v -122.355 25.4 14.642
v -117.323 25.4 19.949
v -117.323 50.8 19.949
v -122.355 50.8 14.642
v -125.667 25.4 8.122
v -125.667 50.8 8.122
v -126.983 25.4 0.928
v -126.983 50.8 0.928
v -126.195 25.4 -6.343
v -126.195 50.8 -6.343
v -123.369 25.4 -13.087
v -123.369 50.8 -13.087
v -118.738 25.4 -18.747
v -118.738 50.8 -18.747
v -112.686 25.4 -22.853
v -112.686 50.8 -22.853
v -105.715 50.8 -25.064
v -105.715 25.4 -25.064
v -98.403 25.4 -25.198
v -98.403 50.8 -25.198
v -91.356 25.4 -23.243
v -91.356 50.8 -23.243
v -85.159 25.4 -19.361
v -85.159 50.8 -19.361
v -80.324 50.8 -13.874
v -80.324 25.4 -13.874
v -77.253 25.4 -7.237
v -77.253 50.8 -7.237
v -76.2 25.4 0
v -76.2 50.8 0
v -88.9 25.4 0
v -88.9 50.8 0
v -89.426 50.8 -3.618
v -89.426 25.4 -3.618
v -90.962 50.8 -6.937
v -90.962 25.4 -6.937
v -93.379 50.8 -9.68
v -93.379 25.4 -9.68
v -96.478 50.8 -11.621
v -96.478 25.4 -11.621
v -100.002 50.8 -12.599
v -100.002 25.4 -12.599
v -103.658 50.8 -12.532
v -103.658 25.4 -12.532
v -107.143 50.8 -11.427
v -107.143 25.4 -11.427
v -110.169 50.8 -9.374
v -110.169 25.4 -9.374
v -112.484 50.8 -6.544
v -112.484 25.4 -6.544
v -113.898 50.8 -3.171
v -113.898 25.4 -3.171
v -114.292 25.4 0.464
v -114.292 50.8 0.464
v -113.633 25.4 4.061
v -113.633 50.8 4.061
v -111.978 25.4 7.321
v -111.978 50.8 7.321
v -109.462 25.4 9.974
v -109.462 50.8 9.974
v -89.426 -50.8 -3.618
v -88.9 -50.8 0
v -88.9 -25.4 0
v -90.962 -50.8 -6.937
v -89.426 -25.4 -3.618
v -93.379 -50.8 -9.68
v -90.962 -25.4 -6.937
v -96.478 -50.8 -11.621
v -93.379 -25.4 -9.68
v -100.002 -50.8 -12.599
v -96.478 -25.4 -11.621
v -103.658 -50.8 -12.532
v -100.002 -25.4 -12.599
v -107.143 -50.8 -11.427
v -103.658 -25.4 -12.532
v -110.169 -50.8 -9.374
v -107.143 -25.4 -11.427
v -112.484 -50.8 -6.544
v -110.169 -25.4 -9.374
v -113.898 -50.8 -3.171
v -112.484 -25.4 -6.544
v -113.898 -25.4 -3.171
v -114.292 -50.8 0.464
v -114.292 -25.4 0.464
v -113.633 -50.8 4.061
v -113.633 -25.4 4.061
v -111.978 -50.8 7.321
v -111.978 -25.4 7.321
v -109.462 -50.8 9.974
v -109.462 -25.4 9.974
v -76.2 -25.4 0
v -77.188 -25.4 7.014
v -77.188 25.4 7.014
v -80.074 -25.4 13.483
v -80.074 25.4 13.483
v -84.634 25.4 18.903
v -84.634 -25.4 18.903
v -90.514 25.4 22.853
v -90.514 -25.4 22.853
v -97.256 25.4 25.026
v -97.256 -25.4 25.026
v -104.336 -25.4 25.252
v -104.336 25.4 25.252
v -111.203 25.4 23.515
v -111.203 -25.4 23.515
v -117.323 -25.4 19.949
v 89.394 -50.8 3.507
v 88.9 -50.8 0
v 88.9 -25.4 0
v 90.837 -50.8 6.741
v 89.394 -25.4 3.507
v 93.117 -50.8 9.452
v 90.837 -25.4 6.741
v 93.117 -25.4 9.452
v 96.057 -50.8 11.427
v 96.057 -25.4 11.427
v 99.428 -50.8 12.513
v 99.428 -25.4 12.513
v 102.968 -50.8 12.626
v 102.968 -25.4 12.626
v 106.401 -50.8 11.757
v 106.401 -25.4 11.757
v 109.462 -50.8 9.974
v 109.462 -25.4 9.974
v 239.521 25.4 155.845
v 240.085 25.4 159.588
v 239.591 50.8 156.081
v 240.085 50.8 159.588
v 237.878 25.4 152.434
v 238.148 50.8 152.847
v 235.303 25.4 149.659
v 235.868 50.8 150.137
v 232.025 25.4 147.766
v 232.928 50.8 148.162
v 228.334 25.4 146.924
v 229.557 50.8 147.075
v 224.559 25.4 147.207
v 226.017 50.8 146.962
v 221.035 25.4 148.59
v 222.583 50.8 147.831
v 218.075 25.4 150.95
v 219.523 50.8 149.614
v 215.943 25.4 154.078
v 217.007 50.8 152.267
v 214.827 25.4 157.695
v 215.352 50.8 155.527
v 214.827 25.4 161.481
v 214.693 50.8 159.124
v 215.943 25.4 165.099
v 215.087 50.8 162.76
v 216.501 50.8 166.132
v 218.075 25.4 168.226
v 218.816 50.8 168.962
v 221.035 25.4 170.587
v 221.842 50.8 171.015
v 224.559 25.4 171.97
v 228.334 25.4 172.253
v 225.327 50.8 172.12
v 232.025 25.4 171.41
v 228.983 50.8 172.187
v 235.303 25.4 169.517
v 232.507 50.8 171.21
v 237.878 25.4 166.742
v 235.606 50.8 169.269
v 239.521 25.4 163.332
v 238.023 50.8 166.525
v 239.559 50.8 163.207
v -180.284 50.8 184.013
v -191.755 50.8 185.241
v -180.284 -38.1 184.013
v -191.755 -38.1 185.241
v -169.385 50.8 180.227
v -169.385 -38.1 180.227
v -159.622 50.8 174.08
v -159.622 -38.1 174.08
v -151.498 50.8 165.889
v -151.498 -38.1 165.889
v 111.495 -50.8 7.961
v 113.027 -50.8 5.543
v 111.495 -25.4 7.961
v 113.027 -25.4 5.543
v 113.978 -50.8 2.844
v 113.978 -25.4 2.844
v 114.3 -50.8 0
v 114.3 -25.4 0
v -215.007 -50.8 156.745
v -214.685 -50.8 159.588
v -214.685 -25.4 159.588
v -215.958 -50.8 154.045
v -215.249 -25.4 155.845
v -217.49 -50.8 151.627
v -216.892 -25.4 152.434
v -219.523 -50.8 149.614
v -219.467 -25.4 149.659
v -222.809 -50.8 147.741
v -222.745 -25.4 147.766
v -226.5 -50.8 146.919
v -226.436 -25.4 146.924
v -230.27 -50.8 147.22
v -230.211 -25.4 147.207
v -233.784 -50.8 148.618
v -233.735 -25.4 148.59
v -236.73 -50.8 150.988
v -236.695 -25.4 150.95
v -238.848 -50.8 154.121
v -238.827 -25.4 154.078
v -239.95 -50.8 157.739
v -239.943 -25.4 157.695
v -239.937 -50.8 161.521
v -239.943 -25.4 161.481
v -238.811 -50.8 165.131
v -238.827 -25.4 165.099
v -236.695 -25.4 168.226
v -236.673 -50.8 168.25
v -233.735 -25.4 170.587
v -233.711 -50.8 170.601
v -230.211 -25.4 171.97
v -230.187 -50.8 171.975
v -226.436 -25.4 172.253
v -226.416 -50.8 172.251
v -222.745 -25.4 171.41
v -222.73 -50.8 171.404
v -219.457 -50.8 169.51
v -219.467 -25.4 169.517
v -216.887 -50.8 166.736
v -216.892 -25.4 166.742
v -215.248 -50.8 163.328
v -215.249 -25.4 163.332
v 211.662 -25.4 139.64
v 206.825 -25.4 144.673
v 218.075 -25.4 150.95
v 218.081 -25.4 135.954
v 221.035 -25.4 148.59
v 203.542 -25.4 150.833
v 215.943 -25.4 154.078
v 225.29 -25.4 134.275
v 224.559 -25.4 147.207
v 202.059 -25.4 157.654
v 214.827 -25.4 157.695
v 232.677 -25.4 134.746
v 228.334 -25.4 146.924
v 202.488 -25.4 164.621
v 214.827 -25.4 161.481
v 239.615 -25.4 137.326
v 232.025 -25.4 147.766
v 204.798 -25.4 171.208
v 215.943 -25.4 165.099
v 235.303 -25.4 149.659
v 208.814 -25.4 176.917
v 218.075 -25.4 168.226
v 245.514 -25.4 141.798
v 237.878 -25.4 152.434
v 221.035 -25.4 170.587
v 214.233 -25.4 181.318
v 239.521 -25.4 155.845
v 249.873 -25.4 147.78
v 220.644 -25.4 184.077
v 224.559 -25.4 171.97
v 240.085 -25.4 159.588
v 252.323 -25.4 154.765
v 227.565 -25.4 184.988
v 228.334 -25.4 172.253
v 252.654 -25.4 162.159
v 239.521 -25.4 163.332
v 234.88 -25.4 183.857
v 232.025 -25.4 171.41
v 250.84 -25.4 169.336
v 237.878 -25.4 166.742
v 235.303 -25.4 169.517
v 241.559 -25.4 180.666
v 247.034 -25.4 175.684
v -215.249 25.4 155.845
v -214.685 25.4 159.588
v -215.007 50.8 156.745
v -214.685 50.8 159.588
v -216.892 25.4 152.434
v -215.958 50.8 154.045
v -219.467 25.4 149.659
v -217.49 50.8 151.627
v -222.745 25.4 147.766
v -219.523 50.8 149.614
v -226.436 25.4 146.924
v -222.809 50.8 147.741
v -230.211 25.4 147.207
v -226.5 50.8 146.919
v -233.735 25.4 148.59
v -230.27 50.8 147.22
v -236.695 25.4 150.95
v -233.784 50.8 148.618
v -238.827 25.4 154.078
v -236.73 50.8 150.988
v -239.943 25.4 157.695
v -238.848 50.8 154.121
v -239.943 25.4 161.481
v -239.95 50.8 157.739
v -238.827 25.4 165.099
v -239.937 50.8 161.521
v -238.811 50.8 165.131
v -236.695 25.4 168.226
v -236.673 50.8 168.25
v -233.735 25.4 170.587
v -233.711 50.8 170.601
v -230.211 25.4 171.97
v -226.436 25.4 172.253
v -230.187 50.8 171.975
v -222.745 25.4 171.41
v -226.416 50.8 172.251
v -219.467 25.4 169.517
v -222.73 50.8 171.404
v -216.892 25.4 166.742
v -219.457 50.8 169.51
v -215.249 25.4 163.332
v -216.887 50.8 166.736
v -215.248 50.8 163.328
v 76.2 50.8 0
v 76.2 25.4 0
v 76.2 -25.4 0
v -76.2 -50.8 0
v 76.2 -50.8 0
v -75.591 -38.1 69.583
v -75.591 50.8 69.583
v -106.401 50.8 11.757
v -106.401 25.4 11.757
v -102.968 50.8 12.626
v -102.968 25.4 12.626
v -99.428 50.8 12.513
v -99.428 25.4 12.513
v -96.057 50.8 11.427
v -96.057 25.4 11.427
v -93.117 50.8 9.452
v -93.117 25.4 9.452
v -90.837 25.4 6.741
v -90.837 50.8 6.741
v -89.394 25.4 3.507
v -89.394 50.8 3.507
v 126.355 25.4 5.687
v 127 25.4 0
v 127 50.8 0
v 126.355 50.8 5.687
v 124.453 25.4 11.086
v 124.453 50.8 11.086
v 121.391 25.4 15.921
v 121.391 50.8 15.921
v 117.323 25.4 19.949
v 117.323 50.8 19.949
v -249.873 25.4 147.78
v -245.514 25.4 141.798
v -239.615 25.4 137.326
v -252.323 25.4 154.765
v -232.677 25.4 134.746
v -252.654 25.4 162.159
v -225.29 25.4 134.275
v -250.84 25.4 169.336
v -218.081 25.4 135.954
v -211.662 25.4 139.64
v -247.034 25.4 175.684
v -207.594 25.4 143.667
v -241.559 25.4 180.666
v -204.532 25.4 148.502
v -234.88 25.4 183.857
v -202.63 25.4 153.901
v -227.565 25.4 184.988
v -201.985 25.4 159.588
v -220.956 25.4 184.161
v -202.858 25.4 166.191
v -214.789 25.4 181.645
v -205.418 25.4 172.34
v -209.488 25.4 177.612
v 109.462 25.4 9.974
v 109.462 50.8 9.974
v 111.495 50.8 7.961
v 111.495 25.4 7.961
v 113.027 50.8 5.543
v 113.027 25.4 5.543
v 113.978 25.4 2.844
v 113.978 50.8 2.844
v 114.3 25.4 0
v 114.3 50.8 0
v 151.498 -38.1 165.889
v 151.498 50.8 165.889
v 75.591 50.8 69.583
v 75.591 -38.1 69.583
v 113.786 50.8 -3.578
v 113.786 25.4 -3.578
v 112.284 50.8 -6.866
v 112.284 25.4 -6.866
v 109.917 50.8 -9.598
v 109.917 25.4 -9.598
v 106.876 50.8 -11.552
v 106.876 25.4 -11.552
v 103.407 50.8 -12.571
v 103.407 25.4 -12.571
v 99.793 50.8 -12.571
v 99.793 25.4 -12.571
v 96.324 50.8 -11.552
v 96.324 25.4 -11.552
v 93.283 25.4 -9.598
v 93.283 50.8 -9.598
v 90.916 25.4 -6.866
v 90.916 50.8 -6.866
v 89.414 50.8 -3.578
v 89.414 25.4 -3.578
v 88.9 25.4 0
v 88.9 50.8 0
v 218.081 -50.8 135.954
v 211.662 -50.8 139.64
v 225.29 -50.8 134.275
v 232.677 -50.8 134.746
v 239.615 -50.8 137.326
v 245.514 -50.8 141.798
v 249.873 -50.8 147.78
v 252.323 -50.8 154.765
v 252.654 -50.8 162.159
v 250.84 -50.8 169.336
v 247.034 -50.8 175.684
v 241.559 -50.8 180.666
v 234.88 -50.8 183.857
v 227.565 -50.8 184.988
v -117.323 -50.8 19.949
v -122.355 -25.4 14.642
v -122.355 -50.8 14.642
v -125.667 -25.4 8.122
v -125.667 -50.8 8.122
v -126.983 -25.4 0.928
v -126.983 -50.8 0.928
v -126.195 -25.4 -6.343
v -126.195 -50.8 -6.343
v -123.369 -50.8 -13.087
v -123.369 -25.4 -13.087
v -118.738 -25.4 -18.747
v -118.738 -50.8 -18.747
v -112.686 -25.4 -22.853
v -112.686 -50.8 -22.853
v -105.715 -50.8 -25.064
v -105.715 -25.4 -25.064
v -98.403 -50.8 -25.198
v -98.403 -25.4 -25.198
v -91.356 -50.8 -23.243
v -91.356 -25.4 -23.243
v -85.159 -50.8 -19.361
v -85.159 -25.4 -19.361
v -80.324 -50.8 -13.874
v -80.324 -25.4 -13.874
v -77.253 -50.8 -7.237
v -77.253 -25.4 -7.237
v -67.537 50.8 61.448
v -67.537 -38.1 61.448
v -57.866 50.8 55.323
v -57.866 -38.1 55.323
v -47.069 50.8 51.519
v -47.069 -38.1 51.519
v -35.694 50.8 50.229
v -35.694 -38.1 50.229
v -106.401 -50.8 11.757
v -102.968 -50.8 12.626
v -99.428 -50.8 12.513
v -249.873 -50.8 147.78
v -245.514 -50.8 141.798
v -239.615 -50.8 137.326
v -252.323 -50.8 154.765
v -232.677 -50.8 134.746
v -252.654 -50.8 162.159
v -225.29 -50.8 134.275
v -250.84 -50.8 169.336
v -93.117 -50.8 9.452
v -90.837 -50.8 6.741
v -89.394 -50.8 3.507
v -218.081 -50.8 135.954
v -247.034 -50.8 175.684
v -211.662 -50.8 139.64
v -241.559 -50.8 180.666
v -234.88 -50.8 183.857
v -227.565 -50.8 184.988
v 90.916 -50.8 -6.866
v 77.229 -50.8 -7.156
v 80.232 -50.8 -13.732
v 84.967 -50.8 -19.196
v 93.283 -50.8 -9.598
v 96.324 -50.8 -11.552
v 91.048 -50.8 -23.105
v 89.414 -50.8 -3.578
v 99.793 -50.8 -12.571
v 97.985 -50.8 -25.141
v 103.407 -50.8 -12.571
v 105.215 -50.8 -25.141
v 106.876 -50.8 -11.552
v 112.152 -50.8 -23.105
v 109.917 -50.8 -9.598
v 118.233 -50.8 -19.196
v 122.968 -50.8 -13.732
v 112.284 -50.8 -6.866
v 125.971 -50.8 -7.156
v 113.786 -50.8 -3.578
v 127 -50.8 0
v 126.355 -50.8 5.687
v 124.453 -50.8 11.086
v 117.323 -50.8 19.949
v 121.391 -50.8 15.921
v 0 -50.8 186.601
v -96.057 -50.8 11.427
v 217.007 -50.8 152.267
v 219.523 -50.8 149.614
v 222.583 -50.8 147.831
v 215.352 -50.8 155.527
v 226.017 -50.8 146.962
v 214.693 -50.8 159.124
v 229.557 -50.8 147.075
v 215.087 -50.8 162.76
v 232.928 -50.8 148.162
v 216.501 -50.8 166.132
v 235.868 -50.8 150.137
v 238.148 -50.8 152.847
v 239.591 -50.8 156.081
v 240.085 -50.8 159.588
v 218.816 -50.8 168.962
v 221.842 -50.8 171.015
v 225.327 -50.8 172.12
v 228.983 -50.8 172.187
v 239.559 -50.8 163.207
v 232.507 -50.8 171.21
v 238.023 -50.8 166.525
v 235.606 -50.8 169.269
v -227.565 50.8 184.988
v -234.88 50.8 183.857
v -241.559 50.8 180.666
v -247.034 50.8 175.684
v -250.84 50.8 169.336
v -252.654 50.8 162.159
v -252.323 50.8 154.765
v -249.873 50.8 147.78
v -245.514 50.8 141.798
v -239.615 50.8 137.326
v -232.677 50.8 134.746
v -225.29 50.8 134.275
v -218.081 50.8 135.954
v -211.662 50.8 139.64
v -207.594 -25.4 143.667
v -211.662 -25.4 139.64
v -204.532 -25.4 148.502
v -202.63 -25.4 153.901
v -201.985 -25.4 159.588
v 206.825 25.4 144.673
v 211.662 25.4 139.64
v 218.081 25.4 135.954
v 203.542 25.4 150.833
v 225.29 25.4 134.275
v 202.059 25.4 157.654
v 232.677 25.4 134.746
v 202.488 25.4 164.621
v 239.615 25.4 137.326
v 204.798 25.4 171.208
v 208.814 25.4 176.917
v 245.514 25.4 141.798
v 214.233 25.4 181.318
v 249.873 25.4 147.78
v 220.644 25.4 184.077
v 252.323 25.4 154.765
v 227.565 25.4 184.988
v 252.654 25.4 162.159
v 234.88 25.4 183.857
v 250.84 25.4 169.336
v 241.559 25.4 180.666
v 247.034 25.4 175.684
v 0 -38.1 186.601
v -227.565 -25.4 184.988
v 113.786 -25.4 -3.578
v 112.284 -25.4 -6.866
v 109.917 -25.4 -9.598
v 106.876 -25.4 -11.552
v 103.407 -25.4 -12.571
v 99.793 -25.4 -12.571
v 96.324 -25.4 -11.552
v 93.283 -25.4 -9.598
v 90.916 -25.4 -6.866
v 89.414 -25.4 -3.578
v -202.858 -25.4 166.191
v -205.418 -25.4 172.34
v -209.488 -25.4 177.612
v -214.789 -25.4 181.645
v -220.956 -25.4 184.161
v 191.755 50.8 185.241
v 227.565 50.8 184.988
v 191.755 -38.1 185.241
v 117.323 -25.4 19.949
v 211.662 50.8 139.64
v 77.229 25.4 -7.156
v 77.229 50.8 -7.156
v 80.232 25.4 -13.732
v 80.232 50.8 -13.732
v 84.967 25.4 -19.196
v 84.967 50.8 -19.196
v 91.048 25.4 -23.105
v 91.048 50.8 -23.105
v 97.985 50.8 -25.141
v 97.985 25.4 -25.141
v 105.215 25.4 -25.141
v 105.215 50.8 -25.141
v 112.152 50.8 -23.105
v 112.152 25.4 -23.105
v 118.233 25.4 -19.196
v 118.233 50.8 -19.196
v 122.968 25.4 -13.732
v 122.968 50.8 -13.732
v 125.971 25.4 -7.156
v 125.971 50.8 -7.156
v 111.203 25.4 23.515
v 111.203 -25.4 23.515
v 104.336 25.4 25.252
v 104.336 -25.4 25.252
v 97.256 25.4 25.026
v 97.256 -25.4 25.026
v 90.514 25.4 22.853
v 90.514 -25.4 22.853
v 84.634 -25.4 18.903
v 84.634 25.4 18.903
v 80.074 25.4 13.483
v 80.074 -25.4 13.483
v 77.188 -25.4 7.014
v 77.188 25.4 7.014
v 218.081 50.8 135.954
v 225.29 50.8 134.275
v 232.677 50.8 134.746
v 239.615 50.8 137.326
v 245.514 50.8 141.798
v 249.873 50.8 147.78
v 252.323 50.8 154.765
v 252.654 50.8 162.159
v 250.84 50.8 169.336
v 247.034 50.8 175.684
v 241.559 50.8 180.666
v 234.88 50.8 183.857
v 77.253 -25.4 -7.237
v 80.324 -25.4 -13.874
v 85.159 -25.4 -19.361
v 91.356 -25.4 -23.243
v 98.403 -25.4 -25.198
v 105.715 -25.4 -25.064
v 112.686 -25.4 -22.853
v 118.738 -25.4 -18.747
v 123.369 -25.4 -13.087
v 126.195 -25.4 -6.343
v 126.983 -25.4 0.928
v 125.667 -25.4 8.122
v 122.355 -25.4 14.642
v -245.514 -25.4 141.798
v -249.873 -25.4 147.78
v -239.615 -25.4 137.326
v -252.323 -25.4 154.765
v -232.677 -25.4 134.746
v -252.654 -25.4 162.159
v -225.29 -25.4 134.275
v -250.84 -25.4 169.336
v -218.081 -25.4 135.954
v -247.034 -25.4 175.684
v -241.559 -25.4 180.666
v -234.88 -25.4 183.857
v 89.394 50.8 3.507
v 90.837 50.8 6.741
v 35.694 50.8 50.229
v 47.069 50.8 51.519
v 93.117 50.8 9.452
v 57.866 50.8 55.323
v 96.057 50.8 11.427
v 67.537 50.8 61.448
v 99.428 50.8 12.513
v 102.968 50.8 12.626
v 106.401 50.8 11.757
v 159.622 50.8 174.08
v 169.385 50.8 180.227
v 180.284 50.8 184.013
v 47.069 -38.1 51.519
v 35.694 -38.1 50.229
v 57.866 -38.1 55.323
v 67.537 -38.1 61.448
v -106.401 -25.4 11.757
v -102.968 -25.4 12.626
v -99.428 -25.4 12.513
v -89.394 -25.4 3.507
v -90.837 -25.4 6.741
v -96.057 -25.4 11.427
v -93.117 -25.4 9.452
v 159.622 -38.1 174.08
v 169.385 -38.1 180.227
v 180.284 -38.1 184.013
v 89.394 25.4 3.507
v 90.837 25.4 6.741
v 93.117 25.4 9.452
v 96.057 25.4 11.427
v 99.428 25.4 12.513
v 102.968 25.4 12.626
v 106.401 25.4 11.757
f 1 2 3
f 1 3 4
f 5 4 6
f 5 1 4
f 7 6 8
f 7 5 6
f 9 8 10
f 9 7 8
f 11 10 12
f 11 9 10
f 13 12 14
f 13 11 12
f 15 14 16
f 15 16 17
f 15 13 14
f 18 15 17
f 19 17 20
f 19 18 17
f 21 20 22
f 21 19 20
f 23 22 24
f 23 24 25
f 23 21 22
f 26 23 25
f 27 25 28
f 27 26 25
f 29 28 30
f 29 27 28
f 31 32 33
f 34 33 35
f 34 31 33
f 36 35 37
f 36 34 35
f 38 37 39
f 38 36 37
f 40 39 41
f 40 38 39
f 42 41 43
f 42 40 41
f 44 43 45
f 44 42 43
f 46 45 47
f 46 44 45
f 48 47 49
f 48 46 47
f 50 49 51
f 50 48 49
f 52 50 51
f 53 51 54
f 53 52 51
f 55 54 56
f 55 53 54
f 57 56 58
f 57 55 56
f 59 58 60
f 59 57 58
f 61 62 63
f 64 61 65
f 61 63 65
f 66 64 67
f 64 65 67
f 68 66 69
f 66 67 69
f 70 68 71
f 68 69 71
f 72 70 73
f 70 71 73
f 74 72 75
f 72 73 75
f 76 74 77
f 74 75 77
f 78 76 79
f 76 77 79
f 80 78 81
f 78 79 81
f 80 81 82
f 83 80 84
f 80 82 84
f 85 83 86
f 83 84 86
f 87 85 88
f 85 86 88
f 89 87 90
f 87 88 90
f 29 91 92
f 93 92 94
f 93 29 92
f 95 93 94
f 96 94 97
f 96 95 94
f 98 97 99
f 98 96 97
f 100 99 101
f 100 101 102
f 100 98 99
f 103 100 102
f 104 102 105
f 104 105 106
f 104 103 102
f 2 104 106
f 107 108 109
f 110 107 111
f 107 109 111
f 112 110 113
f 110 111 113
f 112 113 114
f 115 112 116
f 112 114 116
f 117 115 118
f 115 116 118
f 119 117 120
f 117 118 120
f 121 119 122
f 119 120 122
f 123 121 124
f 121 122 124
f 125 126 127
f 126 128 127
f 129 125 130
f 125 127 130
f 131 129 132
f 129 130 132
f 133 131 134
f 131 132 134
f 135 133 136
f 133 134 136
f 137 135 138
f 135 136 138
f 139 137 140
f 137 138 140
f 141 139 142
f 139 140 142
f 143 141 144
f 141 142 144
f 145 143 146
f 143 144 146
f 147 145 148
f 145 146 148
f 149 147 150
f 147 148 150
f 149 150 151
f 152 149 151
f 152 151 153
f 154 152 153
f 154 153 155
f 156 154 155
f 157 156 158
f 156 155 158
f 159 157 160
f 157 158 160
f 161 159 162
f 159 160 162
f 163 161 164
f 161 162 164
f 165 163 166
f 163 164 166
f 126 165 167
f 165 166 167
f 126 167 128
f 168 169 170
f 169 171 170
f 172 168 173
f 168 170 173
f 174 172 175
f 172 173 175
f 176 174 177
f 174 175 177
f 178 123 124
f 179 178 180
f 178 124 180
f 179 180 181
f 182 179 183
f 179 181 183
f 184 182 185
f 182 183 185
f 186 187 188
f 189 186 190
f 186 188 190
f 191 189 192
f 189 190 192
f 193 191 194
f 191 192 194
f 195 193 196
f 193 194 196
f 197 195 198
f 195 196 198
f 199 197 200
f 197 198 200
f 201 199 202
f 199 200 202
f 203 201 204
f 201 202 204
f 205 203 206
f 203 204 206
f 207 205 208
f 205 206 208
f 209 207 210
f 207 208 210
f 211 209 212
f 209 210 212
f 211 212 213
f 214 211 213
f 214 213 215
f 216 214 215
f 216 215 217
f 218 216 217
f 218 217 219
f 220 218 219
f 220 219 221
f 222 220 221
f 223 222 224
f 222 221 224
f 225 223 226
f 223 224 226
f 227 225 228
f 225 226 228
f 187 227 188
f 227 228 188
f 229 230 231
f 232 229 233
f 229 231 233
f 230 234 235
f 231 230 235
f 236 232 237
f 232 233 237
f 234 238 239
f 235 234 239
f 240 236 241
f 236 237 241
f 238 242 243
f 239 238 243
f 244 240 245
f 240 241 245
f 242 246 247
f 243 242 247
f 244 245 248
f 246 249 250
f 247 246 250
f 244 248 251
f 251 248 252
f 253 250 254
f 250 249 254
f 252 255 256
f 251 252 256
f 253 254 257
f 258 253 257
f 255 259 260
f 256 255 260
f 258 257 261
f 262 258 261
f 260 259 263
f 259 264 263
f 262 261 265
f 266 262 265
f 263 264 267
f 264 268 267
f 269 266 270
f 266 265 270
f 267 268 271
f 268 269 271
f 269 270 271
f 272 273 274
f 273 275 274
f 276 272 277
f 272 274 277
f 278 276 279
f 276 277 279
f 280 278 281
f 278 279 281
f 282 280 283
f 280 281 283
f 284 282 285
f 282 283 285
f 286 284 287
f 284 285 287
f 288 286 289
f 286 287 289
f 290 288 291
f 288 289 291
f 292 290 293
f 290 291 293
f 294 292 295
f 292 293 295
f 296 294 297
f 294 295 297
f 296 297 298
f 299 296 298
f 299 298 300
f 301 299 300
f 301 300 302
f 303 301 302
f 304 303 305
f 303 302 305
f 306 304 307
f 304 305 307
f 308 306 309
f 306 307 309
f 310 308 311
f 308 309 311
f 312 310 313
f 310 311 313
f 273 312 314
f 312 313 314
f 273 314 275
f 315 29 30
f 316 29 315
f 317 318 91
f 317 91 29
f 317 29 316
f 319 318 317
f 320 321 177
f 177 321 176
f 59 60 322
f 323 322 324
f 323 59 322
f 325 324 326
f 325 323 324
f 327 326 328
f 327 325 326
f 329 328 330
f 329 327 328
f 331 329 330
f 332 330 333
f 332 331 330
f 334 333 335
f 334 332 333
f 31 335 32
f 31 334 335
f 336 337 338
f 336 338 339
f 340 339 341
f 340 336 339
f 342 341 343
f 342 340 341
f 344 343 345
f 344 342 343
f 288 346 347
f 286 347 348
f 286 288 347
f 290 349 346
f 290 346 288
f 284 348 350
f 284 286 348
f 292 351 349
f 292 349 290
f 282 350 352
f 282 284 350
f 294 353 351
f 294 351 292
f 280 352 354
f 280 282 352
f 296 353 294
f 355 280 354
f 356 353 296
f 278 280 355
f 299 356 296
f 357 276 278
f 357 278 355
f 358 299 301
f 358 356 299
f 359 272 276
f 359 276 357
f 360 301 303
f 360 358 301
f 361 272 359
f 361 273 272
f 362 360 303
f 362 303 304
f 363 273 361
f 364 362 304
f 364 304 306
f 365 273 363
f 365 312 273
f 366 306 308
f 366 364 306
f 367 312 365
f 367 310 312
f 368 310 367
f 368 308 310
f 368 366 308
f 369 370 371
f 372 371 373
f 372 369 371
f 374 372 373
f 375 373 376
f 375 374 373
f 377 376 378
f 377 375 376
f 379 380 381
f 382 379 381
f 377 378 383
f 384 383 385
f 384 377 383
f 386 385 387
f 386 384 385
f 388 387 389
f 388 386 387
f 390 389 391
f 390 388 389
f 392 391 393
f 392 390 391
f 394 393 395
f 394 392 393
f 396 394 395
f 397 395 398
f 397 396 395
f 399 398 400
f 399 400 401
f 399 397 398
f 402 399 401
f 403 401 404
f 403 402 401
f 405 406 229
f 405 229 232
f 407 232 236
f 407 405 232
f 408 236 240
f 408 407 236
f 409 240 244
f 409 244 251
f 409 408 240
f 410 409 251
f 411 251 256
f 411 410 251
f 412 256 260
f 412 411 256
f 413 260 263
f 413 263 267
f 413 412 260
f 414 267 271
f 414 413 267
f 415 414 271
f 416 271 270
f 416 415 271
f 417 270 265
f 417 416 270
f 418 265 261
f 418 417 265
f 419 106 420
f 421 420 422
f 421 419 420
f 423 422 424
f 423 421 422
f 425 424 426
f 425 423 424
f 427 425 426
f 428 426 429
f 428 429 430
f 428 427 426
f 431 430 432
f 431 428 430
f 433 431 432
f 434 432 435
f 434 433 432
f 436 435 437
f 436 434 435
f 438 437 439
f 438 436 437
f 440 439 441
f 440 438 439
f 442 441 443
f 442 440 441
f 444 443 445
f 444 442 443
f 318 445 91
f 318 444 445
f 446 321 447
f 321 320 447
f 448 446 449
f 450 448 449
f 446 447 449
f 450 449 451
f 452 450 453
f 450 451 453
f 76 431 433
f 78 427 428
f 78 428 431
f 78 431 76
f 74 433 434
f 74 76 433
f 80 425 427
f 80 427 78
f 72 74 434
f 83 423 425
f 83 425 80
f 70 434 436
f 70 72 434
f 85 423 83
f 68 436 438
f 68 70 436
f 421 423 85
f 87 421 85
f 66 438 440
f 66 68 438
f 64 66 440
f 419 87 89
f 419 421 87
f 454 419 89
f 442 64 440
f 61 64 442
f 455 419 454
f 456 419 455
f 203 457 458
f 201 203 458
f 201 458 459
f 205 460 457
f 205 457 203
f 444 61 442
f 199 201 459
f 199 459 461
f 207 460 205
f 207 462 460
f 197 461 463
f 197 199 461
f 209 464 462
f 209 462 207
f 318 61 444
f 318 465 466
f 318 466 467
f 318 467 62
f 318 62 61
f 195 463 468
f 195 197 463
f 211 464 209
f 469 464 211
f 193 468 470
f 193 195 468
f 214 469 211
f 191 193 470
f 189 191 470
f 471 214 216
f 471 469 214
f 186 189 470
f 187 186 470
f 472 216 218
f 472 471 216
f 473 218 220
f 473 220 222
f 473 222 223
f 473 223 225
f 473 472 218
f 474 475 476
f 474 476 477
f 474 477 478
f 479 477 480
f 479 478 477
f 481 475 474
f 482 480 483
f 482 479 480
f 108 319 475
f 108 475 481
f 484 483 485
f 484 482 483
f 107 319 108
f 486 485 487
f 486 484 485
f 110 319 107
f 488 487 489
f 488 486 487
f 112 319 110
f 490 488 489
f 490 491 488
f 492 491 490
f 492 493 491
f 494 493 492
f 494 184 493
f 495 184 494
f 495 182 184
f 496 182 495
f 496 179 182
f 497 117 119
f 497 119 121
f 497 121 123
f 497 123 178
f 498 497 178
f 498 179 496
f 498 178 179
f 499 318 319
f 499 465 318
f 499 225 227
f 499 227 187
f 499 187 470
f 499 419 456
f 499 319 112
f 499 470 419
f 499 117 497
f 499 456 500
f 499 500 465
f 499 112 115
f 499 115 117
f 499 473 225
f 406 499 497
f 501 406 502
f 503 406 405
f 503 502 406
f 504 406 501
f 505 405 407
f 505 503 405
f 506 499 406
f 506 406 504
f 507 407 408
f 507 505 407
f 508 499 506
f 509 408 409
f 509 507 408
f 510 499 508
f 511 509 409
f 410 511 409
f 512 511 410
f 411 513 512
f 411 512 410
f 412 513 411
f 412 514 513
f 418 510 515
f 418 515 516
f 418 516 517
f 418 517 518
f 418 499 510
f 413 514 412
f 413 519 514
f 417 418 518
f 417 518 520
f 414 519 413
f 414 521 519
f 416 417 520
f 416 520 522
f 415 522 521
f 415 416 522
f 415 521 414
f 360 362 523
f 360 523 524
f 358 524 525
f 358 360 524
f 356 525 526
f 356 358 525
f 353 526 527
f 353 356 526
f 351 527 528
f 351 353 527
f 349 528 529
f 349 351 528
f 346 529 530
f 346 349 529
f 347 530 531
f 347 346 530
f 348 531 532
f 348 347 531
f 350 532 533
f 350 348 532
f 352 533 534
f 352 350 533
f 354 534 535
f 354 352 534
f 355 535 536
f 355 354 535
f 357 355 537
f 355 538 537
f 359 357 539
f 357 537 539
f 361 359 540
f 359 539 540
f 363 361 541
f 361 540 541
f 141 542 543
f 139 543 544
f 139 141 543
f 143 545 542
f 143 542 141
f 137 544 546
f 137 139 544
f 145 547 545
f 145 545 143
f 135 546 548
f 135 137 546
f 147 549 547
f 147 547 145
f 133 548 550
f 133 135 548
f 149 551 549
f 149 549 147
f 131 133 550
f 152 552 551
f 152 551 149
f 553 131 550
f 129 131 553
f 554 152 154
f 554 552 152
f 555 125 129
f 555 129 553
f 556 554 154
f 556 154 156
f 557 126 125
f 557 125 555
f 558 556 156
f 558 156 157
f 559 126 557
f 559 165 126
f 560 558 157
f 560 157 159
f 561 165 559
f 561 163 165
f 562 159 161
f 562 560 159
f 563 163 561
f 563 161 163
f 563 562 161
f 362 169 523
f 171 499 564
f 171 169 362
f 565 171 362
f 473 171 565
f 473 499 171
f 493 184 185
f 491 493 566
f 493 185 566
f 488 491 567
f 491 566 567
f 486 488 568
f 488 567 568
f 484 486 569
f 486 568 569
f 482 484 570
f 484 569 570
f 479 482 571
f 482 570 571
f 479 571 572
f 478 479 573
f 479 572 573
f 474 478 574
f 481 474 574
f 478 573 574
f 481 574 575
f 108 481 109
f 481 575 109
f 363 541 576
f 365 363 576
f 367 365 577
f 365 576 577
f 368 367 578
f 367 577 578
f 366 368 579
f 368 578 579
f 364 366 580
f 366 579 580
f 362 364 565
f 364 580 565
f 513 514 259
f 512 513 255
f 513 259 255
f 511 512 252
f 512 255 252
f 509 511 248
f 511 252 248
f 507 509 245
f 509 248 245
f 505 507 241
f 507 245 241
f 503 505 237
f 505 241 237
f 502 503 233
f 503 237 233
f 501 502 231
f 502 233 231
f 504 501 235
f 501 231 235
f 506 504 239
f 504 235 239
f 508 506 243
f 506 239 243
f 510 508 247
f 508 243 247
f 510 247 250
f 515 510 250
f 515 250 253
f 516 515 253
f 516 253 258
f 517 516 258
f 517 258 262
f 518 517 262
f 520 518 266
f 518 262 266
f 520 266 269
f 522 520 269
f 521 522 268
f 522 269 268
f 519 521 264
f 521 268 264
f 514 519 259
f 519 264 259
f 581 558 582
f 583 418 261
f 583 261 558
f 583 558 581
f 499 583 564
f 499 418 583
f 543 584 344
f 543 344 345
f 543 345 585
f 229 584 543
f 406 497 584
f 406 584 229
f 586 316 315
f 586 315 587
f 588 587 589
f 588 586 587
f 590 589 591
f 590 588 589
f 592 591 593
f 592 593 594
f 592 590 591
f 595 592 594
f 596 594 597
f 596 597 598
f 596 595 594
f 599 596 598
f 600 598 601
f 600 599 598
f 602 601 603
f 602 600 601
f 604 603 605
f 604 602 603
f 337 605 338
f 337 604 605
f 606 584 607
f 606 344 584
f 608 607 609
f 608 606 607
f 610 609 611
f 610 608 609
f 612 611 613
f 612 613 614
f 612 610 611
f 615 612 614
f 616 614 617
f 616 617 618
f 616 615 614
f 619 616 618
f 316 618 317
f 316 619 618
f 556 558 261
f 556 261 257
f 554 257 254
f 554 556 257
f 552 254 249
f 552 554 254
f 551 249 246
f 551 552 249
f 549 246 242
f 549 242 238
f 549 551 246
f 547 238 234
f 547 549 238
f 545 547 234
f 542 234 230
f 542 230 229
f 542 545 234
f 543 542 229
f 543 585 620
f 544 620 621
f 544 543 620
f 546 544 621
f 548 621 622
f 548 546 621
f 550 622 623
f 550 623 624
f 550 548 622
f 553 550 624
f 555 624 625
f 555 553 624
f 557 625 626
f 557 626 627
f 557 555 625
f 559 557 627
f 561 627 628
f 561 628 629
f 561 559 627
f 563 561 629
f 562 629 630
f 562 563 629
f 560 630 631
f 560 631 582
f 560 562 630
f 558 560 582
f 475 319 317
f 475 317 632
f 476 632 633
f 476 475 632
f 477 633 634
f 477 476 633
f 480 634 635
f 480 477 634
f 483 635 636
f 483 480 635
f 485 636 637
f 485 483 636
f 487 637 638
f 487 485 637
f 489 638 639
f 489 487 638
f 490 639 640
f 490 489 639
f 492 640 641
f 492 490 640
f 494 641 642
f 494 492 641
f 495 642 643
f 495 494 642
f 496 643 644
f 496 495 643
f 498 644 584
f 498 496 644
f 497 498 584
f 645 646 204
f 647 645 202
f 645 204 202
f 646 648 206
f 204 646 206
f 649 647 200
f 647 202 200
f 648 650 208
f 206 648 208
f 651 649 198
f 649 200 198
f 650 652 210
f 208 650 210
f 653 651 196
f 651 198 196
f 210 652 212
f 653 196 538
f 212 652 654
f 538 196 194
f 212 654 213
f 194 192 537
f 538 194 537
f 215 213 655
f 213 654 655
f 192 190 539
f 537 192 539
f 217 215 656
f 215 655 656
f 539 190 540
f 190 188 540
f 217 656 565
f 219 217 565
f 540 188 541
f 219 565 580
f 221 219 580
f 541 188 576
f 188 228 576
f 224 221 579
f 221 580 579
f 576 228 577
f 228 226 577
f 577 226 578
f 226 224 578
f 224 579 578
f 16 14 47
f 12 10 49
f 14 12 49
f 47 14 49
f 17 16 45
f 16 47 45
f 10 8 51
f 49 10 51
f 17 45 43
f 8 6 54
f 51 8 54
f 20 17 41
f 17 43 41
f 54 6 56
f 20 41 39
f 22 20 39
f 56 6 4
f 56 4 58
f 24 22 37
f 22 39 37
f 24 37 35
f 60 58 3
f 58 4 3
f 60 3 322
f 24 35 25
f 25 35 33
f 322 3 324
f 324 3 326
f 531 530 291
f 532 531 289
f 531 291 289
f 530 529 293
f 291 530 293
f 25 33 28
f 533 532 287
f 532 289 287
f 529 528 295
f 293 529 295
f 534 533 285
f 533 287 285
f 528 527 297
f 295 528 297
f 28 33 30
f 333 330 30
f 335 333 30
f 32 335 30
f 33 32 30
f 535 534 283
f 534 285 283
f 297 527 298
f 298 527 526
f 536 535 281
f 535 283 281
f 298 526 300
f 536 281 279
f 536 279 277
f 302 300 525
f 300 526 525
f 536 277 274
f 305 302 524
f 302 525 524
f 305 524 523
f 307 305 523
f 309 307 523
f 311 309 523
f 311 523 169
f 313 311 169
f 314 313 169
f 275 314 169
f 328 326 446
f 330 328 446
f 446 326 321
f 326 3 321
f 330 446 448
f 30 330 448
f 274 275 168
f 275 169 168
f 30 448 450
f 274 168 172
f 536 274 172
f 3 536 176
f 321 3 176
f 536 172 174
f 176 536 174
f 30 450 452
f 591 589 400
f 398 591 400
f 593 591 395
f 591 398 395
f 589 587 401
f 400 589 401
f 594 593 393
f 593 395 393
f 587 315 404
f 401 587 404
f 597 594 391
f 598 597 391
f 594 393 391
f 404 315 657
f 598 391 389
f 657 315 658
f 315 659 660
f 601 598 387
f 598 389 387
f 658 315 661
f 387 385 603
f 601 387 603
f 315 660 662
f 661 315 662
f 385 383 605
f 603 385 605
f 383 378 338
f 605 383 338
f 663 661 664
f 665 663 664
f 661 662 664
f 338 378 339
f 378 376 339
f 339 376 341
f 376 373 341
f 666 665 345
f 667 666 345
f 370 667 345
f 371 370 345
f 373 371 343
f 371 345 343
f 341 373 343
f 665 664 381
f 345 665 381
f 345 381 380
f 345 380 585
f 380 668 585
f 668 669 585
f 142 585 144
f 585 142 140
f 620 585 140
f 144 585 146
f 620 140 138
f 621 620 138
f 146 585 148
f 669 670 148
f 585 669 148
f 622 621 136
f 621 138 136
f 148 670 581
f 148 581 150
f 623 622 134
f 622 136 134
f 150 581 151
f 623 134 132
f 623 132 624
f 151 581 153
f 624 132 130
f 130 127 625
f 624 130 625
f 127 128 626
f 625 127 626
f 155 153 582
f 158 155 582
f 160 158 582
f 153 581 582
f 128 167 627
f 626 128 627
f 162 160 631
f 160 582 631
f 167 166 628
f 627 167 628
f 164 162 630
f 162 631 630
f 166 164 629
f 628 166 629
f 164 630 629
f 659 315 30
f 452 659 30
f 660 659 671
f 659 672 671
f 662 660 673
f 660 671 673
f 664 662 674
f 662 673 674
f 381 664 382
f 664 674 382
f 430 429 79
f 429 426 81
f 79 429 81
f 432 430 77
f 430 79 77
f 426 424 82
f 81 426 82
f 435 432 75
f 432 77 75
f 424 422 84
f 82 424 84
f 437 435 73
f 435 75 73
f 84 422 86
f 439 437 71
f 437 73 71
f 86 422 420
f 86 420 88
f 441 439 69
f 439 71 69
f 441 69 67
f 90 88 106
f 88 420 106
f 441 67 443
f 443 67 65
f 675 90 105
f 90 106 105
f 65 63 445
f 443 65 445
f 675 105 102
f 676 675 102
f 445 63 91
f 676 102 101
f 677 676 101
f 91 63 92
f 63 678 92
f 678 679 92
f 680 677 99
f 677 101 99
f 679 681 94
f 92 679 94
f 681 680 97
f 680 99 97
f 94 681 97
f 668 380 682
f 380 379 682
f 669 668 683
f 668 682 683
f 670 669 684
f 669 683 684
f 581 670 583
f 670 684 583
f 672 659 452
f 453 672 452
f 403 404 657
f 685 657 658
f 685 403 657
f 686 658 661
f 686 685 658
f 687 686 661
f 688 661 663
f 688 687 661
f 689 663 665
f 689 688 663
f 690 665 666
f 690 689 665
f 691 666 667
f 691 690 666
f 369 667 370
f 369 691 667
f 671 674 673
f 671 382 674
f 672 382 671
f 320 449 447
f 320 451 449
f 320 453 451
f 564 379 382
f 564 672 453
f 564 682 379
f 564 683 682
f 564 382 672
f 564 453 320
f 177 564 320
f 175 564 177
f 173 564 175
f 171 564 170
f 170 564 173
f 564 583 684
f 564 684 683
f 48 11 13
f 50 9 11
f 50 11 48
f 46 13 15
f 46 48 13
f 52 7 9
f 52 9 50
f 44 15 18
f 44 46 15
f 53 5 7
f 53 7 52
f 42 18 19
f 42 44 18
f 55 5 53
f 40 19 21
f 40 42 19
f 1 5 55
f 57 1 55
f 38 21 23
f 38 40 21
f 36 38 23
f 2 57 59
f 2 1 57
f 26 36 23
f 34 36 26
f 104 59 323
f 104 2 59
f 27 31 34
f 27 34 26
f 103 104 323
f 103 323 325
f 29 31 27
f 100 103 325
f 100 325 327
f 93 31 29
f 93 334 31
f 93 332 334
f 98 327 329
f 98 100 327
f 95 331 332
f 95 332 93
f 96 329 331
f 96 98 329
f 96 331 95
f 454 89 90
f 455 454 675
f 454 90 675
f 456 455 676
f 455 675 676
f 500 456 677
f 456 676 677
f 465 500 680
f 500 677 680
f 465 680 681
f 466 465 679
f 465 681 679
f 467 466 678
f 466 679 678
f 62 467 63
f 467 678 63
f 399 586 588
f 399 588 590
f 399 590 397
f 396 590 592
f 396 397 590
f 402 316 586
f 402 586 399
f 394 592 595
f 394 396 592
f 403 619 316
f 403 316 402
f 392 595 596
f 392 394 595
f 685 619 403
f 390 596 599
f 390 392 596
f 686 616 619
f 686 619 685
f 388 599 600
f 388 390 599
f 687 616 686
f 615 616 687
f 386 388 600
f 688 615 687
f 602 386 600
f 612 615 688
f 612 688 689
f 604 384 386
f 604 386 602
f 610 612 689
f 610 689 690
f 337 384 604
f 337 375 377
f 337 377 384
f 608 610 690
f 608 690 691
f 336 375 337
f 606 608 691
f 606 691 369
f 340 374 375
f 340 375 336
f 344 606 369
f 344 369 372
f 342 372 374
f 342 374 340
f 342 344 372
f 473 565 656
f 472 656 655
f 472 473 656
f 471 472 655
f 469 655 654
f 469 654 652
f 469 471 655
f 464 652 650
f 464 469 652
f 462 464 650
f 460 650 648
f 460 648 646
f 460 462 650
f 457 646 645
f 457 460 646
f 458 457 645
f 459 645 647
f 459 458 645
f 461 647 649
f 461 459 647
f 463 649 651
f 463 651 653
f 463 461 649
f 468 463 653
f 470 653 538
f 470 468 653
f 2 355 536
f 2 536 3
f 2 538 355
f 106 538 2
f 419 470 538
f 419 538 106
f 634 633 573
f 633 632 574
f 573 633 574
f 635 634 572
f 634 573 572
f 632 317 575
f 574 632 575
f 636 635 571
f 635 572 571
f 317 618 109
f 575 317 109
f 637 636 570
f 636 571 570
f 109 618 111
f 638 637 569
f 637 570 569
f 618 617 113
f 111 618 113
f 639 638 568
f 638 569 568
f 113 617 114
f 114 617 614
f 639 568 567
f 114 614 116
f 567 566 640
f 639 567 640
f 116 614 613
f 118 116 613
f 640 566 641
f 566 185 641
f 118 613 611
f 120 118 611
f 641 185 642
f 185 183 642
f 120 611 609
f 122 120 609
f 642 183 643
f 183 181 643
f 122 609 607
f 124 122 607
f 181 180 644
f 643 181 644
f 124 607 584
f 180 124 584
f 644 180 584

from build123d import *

# Parameters (mm, degrees)
F2_DEPTH = 50.8
F4_DEPTH = 88.9
F5_R     = 50.8
F6_R     = 12.7
F7_DEPTH = 25.4


with BuildPart() as f2:
    # F0 (on Front) → F2 (new body, symmetric)
    with BuildSketch(Plane.XZ):
        with BuildLine():
            Line((-76.2, 0), (0, 0))
            Line((0, 0), (76.2, 0))
            ThreePointArc((76.2, 0), (90.5141334361, 22.8530864989), (117.3231151597, 19.948525))
            Line((117.3231151597, 19.948525), (211.6618061177, 139.639675))
            ThreePointArc((211.6618061177, 139.639675), (203.4161012645, 167.9938925468), (227.564983392, 184.9875617564))
            Line((227.564983392, 184.9875617564), (0, 186.6008240309))
            Line((0, 186.6008240309), (-227.564983392, 184.9875617564))
            ThreePointArc((-227.564983392, 184.9875617564), (-209.4881838332, 177.6122613863), (-201.9849212774, 159.5882))
            ThreePointArc((-201.9849212774, 159.5882), (-204.5318347785, 148.5023334361), (-211.6618061177, 139.639675))
            Line((-211.6618061177, 139.639675), (-117.3231151597, 19.948525))
            ThreePointArc((-117.3231151597, 19.948525), (-90.5141334361, 22.8530864989), (-76.2, 0))
        make_face()
        with BuildLine():
            ThreePointArc((-227.564983392, 184.9875617564), (-251.3537412903, 151.1825074532), (-211.6618061177, 139.639675))
            ThreePointArc((-211.6618061177, 139.639675), (-204.5318347785, 148.5023334361), (-201.9849212774, 159.5882))
            ThreePointArc((-201.9849212774, 159.5882), (-209.4881838332, 177.6122613863), (-227.564983392, 184.9875617564))
        make_face()
        with BuildLine():
            ThreePointArc((-214.6849212774, 159.5882), (-215.9583780279, 154.0452667181), (-219.5233636976, 149.6139375))
            ThreePointArc((-219.5233636976, 149.6139375), (-238.8114645269, 165.1311332819), (-214.6849212774, 159.5882))
        make_face(mode=Mode.SUBTRACT)
        with BuildLine():
            ThreePointArc((-117.3231151597, 19.948525), (-112.6858665639, -22.8530864989), (-76.2, 0))
            Line((-76.2, 0), (-88.9, 0))
            ThreePointArc((-88.9, 0), (-107.1429332819, -11.4265432495), (-109.4615575798, 9.9742625))
            Line((-109.4615575798, 9.9742625), (-117.3231151597, 19.948525))
        make_face()
        with BuildLine():
            Line((88.9, 0), (76.2, 0))
            ThreePointArc((76.2, 0), (101.6, -25.4), (127, 0))
            ThreePointArc((127, 0), (124.4530864989, 11.0858665639), (117.3231151597, 19.948525))
            Line((117.3231151597, 19.948525), (109.4615575798, 9.9742625))
            ThreePointArc((109.4615575798, 9.9742625), (113.0265432495, 5.5429332819), (114.3, 0))
            ThreePointArc((114.3, 0), (101.6, -12.7), (88.9, 0))
        make_face()
        with BuildLine():
            ThreePointArc((117.3231151597, 19.948525), (90.5141334361, 22.8530864989), (76.2, 0))
            Line((76.2, 0), (88.9, 0))
            ThreePointArc((88.9, 0), (96.0570667181, 11.4265432495), (109.4615575798, 9.9742625))
            Line((109.4615575798, 9.9742625), (117.3231151597, 19.948525))
        make_face()
        with BuildLine():
            Line((-88.9, 0), (-76.2, 0))
            ThreePointArc((-76.2, 0), (-90.5141334361, 22.8530864989), (-117.3231151597, 19.948525))
            Line((-117.3231151597, 19.948525), (-109.4615575798, 9.9742625))
            ThreePointArc((-109.4615575798, 9.9742625), (-96.0570667181, 11.4265432495), (-88.9, 0))
        make_face()
        with BuildLine():
            ThreePointArc((227.564983392, 184.9875617564), (203.4161012645, 167.9938925468), (211.6618061177, 139.639675))
            ThreePointArc((211.6618061177, 139.639675), (238.4707878413, 136.7351135011), (252.7849212774, 159.5882))
            ThreePointArc((252.7849212774, 159.5882), (245.4089826636, 177.4849374441), (227.564983392, 184.9875617564))
        make_face()
        with BuildLine():
            ThreePointArc((240.0849212774, 159.5882), (232.9278545593, 148.1616567505), (219.5233636976, 149.6139375))
            ThreePointArc((219.5233636976, 149.6139375), (221.8419879955, 171.0147432495), (240.0849212774, 159.5882))
        make_face(mode=Mode.SUBTRACT)
    extrude(amount=F2_DEPTH, both=True)

    # F3 (on face) → F4 (cut)
    with BuildSketch(Plane(origin=(0, 50.8, 0), x_dir=(-1, 0, 0), z_dir=(0, 1, 0))):
        Polygon((0, 186.6008240309), (-166.8902328226, 185.4176994896), (-60.3365621927, 50.2289318176), (60.3365621927, 50.2289318176), (166.8902328226, 185.4176994896), align=None)
    extrude(amount=-F4_DEPTH, mode=Mode.SUBTRACT)

    # F5
    f5_edges = [f2.edges().sort_by_distance(p)[0] for p in [
        (166.890233, 6.35, 185.417699),
        (-166.890233, 6.35, 185.417699),
        (-60.336562, 6.35, 50.228932),
        (60.336562, 6.35, 50.228932),
    ]]
    fillet(f5_edges, radius=F5_R)

    # F6 (on face) → F7 (cut, symmetric)
    with BuildSketch(Plane.XZ):
        with BuildLine():
            ThreePointArc((206.9448715698, 133.6551175), (241.7965478104, 129.8791875514), (260.4049212774, 159.5882))
            ThreePointArc((260.4049212774, 159.5882), (241.5199905801, 189.4297853434), (206.4666889451, 185.1371325822))
            Line((206.4666889451, 185.1371325822), (227.564983392, 184.9875617564))
            ThreePointArc((227.564983392, 184.9875617564), (203.4161012645, 167.9938925468), (211.6618061177, 139.639675))
            Line((211.6618061177, 139.639675), (206.9448715698, 133.6551175))
        make_face()
        with Locations((227.3849212774, 159.5882)):
            Circle(F6_R, mode=Mode.SUBTRACT)
        with BuildLine():
            ThreePointArc((134.62, 0), (131.3090124486, 14.411626533), (122.0400497076, 25.9330825))
            Line((122.0400497076, 25.9330825), (117.3231151597, 19.948525))
            ThreePointArc((117.3231151597, 19.948525), (90.5141334361, 22.8530864989), (76.2, 0))
            Line((76.2, 0), (68.58, 0))
            ThreePointArc((68.58, 0), (101.6, -33.02), (134.62, 0))
        make_face()
        with Locations((101.6, 0)):
            Circle(F6_R, mode=Mode.SUBTRACT)
        with BuildLine():
            Line((-117.3231151597, 19.948525), (-122.0400497076, 25.9330825))
            ThreePointArc((-122.0400497076, 25.9330825), (-116.011626533, -29.7090124486), (-68.58, 0))
            Line((-68.58, 0), (-76.2, 0))
            ThreePointArc((-76.2, 0), (-90.5141334361, 22.8530864989), (-117.3231151597, 19.948525))
        make_face()
        with Locations((-101.6, 0)):
            Circle(F6_R, mode=Mode.SUBTRACT)
        with BuildLine():
            Line((-227.564983392, 184.9875617564), (-206.4666889451, 185.1371325822))
            ThreePointArc((-206.4666889451, 185.1371325822), (-260.403496997, 159.8948878633), (-206.9448715698, 133.6551175))
            Line((-206.9448715698, 133.6551175), (-211.6618061177, 139.639675))
            ThreePointArc((-211.6618061177, 139.639675), (-204.5318347785, 148.5023334361), (-201.9849212774, 159.5882))
            ThreePointArc((-201.9849212774, 159.5882), (-209.4881838332, 177.6122613863), (-227.564983392, 184.9875617564))
        make_face()
        with Locations((-227.3849212774, 159.5882)):
            Circle(F6_R, mode=Mode.SUBTRACT)
    extrude(amount=F7_DEPTH, both=True, mode=Mode.SUBTRACT)


solid = f2.part
